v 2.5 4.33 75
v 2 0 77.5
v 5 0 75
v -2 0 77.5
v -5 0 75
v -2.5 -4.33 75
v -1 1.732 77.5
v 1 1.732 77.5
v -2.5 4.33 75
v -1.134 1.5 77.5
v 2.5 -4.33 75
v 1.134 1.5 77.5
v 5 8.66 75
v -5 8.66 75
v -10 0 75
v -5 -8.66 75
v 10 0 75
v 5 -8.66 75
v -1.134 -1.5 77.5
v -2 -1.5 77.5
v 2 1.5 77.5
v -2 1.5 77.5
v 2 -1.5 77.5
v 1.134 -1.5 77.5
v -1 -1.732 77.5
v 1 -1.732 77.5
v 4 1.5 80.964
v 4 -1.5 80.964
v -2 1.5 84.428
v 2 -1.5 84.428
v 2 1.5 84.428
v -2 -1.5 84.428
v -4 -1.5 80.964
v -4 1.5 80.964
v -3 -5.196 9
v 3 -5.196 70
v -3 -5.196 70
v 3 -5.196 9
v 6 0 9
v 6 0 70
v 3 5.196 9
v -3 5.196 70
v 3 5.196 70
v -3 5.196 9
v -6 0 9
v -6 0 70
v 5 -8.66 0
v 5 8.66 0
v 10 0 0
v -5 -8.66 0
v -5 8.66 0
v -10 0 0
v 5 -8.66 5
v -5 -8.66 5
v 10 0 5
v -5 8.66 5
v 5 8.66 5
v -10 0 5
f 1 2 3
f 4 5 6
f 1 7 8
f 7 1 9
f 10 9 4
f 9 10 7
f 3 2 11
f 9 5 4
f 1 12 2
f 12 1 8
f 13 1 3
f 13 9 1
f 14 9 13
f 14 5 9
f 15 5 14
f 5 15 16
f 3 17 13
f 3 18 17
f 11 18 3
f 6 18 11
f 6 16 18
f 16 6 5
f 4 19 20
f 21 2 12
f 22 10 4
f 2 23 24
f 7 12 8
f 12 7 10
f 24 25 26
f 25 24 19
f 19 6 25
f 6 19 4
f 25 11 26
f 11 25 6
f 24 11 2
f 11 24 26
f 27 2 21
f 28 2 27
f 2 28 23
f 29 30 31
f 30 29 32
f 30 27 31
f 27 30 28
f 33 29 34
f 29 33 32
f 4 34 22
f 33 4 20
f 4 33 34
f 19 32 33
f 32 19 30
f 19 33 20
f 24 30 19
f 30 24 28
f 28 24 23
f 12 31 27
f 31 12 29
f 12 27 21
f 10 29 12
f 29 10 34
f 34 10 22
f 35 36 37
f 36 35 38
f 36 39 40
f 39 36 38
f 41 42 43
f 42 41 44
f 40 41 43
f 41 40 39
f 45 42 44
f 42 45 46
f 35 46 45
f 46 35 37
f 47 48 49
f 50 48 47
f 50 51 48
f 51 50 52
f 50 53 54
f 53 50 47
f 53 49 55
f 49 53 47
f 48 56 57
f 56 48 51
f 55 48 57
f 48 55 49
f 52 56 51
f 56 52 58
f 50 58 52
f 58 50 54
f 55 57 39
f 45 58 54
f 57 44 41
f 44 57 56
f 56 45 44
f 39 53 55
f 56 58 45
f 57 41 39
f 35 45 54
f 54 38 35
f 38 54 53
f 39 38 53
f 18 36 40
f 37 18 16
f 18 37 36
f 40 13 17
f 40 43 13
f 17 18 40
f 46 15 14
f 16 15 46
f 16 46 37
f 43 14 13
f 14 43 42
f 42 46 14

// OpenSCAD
// file: config.scad
piece_diam = 12;
base_diam = 20;
base_height = 5;
pawn_height = 25;


$fn=6;
// main file
include <config.scad>;

king_height = pawn_height*3-base_height;
cross_radius = piece_diam/3;

union(){
	cylinder(r=piece_diam/2,h=king_height);
	cylinder(r=base_diam/2,h=base_height);
	translate([0,0,base_height])
		cylinder(r1=base_diam/2,
					r2=piece_diam/2,
					h=(base_diam-piece_diam)/2);
	translate([0,0,king_height])
		cylinder(r1=piece_diam/2,
					r2=base_diam/2,
					h=base_height);
	translate([0,0,king_height+base_height]){
		cylinder(r1=base_diam/4,
					r2=piece_diam/6,
					h=base_height/2);
		translate([0,0,base_height/2+cross_radius*cos(30)])
			rotate([90,0,0])
				cylinder(r=cross_radius,
							h=piece_diam/4,
							center=true);
	}
}
